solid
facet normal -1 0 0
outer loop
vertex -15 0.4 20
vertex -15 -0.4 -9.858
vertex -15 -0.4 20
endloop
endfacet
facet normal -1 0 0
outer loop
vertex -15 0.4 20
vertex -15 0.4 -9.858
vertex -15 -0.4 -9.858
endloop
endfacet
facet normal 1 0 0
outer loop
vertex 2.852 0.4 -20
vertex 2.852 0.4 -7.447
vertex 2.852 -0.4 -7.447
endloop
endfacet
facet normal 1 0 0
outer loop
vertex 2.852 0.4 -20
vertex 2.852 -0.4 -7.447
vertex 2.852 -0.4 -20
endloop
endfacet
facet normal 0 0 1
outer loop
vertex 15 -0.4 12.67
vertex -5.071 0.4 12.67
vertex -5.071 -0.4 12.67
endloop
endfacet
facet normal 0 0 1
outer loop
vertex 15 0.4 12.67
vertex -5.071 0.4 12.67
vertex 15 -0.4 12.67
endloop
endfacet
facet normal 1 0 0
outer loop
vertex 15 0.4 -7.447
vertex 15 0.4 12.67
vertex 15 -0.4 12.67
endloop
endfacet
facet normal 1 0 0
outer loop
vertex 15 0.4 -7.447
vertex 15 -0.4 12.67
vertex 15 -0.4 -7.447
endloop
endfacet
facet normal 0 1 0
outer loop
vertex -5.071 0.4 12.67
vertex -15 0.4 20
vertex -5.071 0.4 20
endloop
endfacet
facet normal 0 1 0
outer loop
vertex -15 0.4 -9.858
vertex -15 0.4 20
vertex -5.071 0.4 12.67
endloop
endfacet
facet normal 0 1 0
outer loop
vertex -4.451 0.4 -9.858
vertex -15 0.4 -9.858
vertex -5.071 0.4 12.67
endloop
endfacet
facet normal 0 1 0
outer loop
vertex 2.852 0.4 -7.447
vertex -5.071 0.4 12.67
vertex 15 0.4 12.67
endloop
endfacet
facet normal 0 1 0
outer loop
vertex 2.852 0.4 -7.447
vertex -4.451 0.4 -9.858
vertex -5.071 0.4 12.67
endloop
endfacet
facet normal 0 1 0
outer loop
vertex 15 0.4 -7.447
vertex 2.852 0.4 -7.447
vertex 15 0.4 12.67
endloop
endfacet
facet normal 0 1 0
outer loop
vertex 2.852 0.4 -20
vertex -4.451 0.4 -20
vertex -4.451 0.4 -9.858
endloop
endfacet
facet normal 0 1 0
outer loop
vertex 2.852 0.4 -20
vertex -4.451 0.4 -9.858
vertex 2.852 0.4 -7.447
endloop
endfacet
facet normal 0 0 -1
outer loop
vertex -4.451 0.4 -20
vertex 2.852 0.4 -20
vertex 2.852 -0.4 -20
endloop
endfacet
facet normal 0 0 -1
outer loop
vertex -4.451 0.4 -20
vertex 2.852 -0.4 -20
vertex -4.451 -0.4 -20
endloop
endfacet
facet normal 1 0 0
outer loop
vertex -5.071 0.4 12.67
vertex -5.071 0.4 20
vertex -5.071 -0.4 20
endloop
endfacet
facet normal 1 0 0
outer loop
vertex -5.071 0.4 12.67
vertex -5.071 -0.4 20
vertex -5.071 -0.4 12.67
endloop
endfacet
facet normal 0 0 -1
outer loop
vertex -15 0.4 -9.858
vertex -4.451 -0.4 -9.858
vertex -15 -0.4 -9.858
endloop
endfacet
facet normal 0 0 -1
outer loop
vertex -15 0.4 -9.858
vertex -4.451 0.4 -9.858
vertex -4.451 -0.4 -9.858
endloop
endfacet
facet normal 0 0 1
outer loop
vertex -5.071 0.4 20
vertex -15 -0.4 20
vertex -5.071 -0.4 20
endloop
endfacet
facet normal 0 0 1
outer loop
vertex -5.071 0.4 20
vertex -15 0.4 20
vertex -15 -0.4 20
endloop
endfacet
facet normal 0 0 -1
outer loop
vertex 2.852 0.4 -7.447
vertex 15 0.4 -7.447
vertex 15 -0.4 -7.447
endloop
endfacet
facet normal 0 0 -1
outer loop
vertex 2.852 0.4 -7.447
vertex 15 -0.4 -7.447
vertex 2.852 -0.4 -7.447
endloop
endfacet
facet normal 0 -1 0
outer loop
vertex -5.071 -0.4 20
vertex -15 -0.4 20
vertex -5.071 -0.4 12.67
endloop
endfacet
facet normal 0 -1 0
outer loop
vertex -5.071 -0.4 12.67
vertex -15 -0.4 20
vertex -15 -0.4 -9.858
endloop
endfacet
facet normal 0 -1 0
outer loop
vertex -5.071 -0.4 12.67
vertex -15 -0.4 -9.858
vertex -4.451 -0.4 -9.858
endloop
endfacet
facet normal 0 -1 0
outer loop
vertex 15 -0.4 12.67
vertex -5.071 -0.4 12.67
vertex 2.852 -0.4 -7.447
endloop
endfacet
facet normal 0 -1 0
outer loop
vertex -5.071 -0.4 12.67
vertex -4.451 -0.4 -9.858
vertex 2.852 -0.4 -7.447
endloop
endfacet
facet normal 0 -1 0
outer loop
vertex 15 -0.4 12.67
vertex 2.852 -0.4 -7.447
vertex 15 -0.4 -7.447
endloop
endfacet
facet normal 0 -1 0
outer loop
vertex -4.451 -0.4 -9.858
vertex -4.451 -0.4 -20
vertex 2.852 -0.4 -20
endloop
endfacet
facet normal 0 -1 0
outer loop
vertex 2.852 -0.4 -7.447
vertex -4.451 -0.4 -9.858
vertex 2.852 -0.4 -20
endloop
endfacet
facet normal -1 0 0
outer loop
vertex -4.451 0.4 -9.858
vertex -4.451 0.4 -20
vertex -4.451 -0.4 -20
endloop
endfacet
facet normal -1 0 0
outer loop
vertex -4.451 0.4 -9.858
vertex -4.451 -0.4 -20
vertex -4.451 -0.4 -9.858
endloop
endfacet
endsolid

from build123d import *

# Parameters (mm, degrees)
BOSS_EXTRU_1_DEPTH = 0.4


with BuildPart() as part:
    # Esquisse1 → Boss.-Extru.1 (new body, symmetric)
    with BuildSketch(Plane(origin=(0, 0, 0), x_dir=(1, 0, 0), z_dir=(0, 1, 0))):
        Polygon((-15, -20), (-5.070958152, -20), (-5.070958152, -12.669744809), (15, -12.669744809), (15, 7.44690143), (2.85169362, 7.44690143), (2.85169362, 20), (-4.450924535, 20), (-4.450924535, 9.858143274), (-15, 9.858143274), align=None)
    extrude(amount=BOSS_EXTRU_1_DEPTH, both=True)


solid = part.part
